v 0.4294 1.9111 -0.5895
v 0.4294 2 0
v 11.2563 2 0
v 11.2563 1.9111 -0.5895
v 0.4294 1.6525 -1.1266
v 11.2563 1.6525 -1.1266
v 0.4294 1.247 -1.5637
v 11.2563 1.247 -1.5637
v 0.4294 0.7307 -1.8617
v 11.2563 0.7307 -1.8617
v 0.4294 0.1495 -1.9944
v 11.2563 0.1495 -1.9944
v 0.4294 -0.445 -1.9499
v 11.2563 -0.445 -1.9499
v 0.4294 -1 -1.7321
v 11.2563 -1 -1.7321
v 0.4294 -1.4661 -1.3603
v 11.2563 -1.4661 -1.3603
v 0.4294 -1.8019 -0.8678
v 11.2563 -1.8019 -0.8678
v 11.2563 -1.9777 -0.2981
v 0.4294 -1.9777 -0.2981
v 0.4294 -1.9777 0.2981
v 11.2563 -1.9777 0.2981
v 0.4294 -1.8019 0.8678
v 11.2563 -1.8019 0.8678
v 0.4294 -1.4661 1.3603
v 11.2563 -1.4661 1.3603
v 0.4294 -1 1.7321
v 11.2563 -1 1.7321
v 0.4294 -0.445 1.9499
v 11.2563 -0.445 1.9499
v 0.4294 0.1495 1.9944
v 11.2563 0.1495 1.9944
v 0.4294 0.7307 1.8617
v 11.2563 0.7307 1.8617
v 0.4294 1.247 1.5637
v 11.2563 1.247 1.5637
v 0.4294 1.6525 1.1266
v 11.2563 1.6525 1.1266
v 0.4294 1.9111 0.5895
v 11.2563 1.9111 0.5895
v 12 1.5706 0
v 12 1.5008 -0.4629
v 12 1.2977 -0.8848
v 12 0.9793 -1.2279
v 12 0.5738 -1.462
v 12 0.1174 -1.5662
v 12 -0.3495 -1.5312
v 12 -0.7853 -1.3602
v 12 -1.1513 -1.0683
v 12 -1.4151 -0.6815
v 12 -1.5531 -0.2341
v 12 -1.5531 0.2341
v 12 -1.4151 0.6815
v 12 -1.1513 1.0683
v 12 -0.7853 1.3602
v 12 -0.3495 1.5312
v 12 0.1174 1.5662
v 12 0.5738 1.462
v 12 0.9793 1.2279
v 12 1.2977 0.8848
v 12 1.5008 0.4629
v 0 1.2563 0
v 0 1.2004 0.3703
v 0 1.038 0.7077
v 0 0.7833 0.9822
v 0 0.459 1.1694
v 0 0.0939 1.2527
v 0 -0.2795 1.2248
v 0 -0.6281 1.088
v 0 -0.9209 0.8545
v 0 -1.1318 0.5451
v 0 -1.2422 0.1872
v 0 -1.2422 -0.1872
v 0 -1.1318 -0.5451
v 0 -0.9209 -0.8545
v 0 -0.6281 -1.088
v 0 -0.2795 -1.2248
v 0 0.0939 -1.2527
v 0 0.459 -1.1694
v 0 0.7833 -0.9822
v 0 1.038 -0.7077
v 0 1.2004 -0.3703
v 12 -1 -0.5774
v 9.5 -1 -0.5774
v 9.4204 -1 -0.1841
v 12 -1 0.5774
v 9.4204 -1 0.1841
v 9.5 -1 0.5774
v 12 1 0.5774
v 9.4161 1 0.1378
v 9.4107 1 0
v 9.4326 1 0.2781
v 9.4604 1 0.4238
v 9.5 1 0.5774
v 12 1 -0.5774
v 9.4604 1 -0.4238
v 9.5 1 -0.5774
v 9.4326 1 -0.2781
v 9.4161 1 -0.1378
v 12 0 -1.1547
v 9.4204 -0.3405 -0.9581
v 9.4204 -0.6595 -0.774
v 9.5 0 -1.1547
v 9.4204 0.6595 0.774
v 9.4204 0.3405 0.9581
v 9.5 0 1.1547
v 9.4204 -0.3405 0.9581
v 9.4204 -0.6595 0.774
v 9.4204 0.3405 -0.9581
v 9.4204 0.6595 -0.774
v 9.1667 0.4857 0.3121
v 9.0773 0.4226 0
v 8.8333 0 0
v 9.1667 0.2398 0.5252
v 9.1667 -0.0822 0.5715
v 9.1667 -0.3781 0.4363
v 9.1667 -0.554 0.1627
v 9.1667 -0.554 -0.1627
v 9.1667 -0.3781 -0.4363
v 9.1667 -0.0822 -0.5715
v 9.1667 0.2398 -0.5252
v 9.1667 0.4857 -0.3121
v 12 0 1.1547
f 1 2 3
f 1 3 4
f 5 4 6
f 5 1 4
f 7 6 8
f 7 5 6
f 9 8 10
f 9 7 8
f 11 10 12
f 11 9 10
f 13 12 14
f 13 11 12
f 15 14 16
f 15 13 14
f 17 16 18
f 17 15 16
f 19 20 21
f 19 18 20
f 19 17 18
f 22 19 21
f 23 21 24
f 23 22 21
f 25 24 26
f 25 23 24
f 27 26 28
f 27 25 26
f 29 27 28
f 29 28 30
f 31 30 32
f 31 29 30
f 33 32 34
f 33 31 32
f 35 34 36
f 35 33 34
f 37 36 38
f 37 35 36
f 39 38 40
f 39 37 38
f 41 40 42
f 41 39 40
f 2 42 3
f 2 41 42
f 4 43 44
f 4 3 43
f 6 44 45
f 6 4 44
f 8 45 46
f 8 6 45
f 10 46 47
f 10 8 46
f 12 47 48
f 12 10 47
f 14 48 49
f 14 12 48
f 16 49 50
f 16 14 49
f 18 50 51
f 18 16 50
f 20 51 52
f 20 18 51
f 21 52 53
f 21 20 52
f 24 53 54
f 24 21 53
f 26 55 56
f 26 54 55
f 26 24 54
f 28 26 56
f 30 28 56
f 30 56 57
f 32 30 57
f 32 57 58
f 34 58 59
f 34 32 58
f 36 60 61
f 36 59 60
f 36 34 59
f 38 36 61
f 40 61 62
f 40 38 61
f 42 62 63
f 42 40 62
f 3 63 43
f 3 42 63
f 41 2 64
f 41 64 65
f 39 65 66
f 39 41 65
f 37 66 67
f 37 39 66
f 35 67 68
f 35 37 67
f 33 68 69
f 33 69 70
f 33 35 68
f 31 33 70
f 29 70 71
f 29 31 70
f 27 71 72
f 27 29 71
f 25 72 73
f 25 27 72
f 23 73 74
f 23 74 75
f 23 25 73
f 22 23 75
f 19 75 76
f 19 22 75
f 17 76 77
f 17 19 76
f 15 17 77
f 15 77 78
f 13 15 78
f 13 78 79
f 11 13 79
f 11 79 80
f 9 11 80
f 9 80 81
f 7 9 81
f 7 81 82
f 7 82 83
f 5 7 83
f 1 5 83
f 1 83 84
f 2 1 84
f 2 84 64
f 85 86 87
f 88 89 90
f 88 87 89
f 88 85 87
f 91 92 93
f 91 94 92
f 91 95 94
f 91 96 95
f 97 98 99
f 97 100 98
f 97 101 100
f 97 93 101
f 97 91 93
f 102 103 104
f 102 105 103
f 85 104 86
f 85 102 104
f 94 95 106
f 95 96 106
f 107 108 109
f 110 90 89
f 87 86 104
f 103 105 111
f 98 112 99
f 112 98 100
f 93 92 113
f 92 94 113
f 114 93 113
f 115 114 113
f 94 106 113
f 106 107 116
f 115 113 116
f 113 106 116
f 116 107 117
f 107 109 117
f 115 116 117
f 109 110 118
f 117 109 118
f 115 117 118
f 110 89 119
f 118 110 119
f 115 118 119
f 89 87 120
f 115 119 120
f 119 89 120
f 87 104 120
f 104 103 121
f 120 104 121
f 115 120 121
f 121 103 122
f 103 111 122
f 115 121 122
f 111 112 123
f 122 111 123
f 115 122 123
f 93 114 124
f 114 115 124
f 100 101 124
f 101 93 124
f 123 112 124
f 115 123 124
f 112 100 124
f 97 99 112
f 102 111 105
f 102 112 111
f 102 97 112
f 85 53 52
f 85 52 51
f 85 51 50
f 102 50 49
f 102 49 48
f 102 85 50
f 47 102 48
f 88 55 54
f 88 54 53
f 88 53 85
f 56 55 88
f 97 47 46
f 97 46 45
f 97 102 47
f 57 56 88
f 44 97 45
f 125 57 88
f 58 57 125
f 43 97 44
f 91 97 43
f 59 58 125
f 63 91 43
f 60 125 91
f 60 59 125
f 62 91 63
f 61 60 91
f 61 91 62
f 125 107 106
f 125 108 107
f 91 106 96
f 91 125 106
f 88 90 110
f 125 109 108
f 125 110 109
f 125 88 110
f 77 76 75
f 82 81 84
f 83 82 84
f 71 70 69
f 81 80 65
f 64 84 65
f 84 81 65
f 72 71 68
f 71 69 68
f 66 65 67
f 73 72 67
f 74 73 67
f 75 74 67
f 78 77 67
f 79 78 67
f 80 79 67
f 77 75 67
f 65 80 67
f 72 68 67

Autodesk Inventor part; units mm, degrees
ref_plane "YZ Plane" through (0, 0, 0) normal (1, 0, 0) x (0, 1, 0)
ref_plane "XZ Plane" through (0, 0, 0) normal (0, 1, 0) x (-1, 0, 0)
sketch "Sketch1" plane through (0, 0, 0) normal (0, 0, 1) x (1, 0, 0)
  line L0 (0, 0) -> (8.8333, 0)
  line L1 (12, 1.1547) -> (12, 2)
  line L2 (12, 2) -> (0, 2)
  line L3 (12, 1.1547) -> (9.5, 1.1547)
  line L4 (9.5, 1.1547) -> (8.8333, 0)
  line L5 (0, -0.4) -> (0, 2.4) projected
  line L6 (0, 2) -> (0, 0)
  dimension "d0" = 2.5
  dimension "d1" = 60
  dimension "d2" = 4
  dimension "d3" = 2.3094
  dimension "d5" = 12
revolve "Body" add sketch "Sketch1" angle 360 about axis through (0, 0, 0) along (1, 0, 0)
chamfer "Chamfer1" distance 0.4294 angle 60 1 edges at (12, -2, 0) measured on face at (12, 1.6877, -0.2517)
sketch "Sketch2" plane through (12, 0, 0) normal (1, 0, 0) x (0, 0, -1)
  circle A0 centre (0, 0) radius 1.1547 projected
  line L0 (-0.5774, 1) -> (0.5774, 1)
  line L1 (0.5774, 1) -> (1.1547, 0)
  line L2 (1.1547, 0) -> (0.5774, -1)
  line L3 (0.5774, -1) -> (-0.5774, -1)
  line L4 (-0.5774, -1) -> (-1.1547, 0)
  line L5 (-1.1547, 0) -> (-0.5774, 1)
  point P0 (0, 0)
  point P1 (0, 0)
extrude "Slot" add sketch "Sketch2" against normal up to next contours L1 A0 | A0 L2 | L0 A0 | A0 L3 | L5 A0 | A0 L4
thread "Thread" size "M4x0.7" class "6g" standard "ISO Metric profile" length 12
chamfer "Chamfer2" distance 0.4294 angle 60 1 edges at (0, -2, 0) measured on face at (3.7521, 1.9935, -0.1609)
ref_plane "Work Plane1" through (6, 0, 0) normal (0, 0.5, 0.866) x (1, 0, 0)
equation "\"d0\" = INTI"
equation "\"d2\" = NND"
equation "\"d3\" = 1.1547 * SW"
equation "\"d5\" = NLG"
equation "\"d7\" = -0.5 * GD1 + 0.5 * NND"
equation "\"d8\" = FAWI"
equation "\"d29\" = -0.5 * GD1 + 0.5 * NND"
equation "\"d11\" = NLG"
equation "\"d13\" = -0.5 * GD1 + 0.5 * NND"
equation "\"d14\" = FAWI"
equation "\"d30\" = -0.5 * GD1 + 0.5 * NND"
equation "\"NND\" = 4"
equation "\"NLG\" = 12"
equation "\"INTI\" = 2.5"
equation "\"FAWI\" = 60deg"
equation "\"SW\" = 2"
equation "\"GD1\" = THREADDIA - 1.2269 * PTC"
equation "\"FAWI1\" = 45deg"
equation "\"GUL\" = 0.61345 * PTC"
equation "\"SPD\" = 2"
equation "\"TOA\" = 30deg"
equation "\"THREADDIA\" = 4"
equation "\"PTC\" = 0.7"
equation "\"GAL\" = 0.61345 * PTC"
equation "\"E0\" = 1.155 * SW"
properties part number "AS 1421 - M4 x 12 Flat Point" material "Steel, Mild"
